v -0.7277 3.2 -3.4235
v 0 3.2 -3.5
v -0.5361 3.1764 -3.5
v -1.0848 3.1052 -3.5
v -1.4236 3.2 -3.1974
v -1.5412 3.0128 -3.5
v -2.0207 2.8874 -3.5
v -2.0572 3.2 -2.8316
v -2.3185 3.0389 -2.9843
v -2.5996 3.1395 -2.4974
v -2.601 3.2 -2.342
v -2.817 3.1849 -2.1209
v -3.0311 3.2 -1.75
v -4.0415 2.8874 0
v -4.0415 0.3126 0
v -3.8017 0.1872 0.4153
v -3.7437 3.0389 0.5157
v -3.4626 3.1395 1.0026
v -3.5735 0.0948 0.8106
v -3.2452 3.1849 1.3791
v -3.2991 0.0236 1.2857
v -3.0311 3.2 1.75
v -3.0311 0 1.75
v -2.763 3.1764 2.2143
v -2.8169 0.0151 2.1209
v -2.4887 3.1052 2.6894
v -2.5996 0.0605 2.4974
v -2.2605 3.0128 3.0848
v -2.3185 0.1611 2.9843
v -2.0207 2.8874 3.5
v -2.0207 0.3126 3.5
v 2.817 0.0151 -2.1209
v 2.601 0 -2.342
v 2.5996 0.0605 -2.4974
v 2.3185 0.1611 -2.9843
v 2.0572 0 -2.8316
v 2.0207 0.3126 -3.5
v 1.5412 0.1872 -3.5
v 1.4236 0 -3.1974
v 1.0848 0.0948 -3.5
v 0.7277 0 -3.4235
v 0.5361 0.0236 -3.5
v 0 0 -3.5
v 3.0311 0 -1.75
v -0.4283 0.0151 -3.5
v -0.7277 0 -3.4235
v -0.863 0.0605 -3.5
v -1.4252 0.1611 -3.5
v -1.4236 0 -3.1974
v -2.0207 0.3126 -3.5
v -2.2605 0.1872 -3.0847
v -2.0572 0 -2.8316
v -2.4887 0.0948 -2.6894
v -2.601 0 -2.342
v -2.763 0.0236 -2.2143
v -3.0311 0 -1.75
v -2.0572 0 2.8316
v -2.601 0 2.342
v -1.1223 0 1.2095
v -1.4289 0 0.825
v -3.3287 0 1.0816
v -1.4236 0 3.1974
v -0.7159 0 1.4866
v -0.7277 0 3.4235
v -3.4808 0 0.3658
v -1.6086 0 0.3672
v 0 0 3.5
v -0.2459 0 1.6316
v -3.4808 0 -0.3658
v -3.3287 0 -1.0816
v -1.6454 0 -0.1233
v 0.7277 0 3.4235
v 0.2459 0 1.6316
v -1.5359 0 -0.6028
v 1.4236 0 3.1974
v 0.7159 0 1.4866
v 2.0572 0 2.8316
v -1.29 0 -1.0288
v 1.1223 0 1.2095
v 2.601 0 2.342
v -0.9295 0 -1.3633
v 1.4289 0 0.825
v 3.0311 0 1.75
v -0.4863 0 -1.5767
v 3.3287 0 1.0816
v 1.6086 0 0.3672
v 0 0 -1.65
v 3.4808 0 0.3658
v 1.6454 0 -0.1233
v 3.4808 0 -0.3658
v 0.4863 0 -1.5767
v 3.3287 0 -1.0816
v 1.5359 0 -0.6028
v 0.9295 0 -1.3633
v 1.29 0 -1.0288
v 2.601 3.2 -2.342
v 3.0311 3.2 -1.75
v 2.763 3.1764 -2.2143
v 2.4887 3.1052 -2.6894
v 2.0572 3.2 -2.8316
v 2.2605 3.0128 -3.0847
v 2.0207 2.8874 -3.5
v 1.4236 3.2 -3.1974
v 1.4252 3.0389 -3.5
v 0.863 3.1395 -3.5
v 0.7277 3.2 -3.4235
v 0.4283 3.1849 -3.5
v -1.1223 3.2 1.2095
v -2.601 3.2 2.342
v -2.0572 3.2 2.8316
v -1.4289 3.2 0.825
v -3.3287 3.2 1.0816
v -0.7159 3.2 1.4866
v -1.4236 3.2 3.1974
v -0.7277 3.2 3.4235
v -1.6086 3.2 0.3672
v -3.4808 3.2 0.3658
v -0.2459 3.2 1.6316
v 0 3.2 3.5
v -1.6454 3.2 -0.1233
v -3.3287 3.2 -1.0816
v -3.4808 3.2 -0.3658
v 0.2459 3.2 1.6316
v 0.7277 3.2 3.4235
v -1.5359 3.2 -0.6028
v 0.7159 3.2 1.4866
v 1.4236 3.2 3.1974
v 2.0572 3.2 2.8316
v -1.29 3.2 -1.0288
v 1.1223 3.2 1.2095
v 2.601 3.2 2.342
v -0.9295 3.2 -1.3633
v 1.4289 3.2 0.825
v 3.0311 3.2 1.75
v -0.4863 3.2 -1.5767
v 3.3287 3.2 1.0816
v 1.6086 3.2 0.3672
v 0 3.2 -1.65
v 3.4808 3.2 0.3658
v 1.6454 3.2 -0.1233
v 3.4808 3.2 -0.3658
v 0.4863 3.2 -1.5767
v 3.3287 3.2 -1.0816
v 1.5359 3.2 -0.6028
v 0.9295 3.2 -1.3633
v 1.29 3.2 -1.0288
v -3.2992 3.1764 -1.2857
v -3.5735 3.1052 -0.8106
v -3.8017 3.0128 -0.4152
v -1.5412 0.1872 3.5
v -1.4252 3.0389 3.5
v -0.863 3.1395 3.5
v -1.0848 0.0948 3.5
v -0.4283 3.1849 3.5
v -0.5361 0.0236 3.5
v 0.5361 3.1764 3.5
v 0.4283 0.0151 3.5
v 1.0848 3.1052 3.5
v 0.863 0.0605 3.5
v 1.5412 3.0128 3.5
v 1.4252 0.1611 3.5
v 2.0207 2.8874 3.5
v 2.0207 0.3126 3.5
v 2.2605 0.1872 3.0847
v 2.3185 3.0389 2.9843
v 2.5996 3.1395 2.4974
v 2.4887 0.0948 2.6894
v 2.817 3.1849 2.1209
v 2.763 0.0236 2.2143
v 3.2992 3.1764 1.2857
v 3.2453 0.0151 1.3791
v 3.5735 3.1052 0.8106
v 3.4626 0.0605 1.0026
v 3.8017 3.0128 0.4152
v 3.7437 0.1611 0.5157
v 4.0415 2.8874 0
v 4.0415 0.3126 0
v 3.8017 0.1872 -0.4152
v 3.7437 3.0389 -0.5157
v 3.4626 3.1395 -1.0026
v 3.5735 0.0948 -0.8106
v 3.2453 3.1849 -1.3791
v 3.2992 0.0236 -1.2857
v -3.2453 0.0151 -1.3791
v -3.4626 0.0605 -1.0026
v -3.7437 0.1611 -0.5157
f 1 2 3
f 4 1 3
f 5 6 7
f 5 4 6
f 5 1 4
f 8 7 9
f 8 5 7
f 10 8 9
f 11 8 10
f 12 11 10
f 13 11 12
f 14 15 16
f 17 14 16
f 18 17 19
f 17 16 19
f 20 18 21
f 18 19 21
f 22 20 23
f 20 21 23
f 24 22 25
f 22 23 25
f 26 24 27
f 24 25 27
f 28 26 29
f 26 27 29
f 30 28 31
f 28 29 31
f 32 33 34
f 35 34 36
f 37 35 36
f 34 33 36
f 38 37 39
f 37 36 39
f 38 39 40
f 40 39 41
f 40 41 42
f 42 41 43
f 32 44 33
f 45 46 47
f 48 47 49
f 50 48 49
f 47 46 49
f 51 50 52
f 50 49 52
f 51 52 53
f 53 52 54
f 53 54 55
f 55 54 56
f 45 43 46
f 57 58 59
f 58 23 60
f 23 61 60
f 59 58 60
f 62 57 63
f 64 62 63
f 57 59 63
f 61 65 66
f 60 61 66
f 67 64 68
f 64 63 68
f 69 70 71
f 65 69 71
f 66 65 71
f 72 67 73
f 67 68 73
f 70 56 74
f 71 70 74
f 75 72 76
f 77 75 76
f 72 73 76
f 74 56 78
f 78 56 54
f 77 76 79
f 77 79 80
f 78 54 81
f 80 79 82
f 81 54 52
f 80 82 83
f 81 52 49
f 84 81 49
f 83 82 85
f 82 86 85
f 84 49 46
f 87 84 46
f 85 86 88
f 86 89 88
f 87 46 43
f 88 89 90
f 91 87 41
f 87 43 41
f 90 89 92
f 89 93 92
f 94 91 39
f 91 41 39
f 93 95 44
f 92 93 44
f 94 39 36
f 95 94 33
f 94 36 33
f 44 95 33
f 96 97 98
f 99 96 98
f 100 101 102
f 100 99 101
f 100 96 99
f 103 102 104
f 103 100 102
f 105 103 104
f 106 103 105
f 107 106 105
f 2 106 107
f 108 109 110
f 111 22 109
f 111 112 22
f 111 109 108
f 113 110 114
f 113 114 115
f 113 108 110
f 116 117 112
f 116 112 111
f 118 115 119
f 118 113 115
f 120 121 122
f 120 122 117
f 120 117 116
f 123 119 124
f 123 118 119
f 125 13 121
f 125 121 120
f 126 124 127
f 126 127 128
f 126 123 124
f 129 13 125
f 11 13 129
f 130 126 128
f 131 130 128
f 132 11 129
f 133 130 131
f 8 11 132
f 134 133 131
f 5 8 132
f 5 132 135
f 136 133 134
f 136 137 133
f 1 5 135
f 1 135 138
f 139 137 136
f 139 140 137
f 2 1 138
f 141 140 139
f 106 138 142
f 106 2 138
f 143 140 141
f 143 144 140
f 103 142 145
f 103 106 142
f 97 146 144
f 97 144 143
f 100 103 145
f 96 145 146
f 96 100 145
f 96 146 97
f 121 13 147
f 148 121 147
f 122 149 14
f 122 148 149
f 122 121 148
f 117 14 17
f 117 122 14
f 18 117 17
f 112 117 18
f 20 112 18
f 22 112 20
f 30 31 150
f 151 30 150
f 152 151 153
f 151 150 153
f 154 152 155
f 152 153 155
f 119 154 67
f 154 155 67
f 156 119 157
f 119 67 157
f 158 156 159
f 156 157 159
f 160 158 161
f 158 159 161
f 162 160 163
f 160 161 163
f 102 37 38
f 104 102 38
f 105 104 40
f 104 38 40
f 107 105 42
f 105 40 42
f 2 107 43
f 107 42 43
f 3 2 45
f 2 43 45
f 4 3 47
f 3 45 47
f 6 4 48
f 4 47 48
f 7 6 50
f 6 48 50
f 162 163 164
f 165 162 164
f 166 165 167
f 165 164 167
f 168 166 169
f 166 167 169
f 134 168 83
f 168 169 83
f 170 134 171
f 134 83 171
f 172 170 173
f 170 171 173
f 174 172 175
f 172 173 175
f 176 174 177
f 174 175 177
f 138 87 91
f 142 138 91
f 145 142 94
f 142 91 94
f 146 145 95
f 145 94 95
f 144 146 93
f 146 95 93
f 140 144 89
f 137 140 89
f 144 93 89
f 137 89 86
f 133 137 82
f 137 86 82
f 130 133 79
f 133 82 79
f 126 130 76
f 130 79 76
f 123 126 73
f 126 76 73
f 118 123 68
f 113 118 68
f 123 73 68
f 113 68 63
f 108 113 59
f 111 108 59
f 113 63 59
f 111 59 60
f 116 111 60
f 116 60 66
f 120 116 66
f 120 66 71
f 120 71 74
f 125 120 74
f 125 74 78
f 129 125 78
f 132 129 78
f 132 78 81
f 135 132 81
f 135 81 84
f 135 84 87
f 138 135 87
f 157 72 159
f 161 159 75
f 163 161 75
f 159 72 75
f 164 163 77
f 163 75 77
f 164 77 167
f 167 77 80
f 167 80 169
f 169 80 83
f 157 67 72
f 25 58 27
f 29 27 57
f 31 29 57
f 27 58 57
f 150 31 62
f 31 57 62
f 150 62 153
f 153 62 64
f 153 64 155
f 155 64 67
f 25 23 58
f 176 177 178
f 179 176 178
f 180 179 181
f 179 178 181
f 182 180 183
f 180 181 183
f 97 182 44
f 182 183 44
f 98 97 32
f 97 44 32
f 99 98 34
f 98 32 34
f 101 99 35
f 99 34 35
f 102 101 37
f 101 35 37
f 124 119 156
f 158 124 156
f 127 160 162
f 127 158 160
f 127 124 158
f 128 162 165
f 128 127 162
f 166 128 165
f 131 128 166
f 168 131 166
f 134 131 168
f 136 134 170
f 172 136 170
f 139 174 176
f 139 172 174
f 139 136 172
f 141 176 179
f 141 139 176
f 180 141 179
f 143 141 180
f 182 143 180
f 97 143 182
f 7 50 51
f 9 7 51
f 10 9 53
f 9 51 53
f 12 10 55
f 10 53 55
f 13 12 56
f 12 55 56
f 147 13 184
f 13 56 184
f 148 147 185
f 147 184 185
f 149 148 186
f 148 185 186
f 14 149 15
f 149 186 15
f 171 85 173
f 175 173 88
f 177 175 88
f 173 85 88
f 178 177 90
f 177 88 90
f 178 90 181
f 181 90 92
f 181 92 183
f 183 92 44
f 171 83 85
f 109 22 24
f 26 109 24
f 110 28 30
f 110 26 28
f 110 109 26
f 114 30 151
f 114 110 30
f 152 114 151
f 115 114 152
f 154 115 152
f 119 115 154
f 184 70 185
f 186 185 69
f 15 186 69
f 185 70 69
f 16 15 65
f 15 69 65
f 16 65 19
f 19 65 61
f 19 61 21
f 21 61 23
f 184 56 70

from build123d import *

# Parameters (mm, degrees)
BOSS_EXTRUDE1_DEPTH = 3.2
M4_TAPPED_HOLE1_D   = 3.3


with BuildPart() as part:
    # Sketch1 → Boss-Extrude1 (new body)
    with BuildSketch(Plane(origin=(0, 0, 0), x_dir=(1, 0, 0), z_dir=(0, 1, 0))):
        Polygon((-2.020725942, -3.5), (2.020725942, -3.5), (4.041451884, 0), (2.020725942, 3.5), (-2.020725942, 3.5), (-4.041451884, 0), align=None)
    extrude(amount=BOSS_EXTRUDE1_DEPTH)

    # Sketch2 → Cut-Revolve1 (revolve, cut)
    with BuildSketch(Plane(origin=(0, 0, 0), x_dir=(0, 0, -1), z_dir=(1, 0, 0))):
        Polygon((5.627238375, 1.228161648), (3.5, 0), (5.627238375, 0), align=None)
        Polygon((3.5, 3.2), (5.644714185, 3.2), (5.644714185, 1.961748688), align=None)
    revolve(axis=Axis((0, 0, 0), (0, 1, 0)), mode=Mode.SUBTRACT)

    # M4 Tapped Hole1 (through all)
    with Locations(Plane.ZX.offset(3.2)):
        with Locations((0, 0)):
            Hole(M4_TAPPED_HOLE1_D / 2)


solid = part.part
